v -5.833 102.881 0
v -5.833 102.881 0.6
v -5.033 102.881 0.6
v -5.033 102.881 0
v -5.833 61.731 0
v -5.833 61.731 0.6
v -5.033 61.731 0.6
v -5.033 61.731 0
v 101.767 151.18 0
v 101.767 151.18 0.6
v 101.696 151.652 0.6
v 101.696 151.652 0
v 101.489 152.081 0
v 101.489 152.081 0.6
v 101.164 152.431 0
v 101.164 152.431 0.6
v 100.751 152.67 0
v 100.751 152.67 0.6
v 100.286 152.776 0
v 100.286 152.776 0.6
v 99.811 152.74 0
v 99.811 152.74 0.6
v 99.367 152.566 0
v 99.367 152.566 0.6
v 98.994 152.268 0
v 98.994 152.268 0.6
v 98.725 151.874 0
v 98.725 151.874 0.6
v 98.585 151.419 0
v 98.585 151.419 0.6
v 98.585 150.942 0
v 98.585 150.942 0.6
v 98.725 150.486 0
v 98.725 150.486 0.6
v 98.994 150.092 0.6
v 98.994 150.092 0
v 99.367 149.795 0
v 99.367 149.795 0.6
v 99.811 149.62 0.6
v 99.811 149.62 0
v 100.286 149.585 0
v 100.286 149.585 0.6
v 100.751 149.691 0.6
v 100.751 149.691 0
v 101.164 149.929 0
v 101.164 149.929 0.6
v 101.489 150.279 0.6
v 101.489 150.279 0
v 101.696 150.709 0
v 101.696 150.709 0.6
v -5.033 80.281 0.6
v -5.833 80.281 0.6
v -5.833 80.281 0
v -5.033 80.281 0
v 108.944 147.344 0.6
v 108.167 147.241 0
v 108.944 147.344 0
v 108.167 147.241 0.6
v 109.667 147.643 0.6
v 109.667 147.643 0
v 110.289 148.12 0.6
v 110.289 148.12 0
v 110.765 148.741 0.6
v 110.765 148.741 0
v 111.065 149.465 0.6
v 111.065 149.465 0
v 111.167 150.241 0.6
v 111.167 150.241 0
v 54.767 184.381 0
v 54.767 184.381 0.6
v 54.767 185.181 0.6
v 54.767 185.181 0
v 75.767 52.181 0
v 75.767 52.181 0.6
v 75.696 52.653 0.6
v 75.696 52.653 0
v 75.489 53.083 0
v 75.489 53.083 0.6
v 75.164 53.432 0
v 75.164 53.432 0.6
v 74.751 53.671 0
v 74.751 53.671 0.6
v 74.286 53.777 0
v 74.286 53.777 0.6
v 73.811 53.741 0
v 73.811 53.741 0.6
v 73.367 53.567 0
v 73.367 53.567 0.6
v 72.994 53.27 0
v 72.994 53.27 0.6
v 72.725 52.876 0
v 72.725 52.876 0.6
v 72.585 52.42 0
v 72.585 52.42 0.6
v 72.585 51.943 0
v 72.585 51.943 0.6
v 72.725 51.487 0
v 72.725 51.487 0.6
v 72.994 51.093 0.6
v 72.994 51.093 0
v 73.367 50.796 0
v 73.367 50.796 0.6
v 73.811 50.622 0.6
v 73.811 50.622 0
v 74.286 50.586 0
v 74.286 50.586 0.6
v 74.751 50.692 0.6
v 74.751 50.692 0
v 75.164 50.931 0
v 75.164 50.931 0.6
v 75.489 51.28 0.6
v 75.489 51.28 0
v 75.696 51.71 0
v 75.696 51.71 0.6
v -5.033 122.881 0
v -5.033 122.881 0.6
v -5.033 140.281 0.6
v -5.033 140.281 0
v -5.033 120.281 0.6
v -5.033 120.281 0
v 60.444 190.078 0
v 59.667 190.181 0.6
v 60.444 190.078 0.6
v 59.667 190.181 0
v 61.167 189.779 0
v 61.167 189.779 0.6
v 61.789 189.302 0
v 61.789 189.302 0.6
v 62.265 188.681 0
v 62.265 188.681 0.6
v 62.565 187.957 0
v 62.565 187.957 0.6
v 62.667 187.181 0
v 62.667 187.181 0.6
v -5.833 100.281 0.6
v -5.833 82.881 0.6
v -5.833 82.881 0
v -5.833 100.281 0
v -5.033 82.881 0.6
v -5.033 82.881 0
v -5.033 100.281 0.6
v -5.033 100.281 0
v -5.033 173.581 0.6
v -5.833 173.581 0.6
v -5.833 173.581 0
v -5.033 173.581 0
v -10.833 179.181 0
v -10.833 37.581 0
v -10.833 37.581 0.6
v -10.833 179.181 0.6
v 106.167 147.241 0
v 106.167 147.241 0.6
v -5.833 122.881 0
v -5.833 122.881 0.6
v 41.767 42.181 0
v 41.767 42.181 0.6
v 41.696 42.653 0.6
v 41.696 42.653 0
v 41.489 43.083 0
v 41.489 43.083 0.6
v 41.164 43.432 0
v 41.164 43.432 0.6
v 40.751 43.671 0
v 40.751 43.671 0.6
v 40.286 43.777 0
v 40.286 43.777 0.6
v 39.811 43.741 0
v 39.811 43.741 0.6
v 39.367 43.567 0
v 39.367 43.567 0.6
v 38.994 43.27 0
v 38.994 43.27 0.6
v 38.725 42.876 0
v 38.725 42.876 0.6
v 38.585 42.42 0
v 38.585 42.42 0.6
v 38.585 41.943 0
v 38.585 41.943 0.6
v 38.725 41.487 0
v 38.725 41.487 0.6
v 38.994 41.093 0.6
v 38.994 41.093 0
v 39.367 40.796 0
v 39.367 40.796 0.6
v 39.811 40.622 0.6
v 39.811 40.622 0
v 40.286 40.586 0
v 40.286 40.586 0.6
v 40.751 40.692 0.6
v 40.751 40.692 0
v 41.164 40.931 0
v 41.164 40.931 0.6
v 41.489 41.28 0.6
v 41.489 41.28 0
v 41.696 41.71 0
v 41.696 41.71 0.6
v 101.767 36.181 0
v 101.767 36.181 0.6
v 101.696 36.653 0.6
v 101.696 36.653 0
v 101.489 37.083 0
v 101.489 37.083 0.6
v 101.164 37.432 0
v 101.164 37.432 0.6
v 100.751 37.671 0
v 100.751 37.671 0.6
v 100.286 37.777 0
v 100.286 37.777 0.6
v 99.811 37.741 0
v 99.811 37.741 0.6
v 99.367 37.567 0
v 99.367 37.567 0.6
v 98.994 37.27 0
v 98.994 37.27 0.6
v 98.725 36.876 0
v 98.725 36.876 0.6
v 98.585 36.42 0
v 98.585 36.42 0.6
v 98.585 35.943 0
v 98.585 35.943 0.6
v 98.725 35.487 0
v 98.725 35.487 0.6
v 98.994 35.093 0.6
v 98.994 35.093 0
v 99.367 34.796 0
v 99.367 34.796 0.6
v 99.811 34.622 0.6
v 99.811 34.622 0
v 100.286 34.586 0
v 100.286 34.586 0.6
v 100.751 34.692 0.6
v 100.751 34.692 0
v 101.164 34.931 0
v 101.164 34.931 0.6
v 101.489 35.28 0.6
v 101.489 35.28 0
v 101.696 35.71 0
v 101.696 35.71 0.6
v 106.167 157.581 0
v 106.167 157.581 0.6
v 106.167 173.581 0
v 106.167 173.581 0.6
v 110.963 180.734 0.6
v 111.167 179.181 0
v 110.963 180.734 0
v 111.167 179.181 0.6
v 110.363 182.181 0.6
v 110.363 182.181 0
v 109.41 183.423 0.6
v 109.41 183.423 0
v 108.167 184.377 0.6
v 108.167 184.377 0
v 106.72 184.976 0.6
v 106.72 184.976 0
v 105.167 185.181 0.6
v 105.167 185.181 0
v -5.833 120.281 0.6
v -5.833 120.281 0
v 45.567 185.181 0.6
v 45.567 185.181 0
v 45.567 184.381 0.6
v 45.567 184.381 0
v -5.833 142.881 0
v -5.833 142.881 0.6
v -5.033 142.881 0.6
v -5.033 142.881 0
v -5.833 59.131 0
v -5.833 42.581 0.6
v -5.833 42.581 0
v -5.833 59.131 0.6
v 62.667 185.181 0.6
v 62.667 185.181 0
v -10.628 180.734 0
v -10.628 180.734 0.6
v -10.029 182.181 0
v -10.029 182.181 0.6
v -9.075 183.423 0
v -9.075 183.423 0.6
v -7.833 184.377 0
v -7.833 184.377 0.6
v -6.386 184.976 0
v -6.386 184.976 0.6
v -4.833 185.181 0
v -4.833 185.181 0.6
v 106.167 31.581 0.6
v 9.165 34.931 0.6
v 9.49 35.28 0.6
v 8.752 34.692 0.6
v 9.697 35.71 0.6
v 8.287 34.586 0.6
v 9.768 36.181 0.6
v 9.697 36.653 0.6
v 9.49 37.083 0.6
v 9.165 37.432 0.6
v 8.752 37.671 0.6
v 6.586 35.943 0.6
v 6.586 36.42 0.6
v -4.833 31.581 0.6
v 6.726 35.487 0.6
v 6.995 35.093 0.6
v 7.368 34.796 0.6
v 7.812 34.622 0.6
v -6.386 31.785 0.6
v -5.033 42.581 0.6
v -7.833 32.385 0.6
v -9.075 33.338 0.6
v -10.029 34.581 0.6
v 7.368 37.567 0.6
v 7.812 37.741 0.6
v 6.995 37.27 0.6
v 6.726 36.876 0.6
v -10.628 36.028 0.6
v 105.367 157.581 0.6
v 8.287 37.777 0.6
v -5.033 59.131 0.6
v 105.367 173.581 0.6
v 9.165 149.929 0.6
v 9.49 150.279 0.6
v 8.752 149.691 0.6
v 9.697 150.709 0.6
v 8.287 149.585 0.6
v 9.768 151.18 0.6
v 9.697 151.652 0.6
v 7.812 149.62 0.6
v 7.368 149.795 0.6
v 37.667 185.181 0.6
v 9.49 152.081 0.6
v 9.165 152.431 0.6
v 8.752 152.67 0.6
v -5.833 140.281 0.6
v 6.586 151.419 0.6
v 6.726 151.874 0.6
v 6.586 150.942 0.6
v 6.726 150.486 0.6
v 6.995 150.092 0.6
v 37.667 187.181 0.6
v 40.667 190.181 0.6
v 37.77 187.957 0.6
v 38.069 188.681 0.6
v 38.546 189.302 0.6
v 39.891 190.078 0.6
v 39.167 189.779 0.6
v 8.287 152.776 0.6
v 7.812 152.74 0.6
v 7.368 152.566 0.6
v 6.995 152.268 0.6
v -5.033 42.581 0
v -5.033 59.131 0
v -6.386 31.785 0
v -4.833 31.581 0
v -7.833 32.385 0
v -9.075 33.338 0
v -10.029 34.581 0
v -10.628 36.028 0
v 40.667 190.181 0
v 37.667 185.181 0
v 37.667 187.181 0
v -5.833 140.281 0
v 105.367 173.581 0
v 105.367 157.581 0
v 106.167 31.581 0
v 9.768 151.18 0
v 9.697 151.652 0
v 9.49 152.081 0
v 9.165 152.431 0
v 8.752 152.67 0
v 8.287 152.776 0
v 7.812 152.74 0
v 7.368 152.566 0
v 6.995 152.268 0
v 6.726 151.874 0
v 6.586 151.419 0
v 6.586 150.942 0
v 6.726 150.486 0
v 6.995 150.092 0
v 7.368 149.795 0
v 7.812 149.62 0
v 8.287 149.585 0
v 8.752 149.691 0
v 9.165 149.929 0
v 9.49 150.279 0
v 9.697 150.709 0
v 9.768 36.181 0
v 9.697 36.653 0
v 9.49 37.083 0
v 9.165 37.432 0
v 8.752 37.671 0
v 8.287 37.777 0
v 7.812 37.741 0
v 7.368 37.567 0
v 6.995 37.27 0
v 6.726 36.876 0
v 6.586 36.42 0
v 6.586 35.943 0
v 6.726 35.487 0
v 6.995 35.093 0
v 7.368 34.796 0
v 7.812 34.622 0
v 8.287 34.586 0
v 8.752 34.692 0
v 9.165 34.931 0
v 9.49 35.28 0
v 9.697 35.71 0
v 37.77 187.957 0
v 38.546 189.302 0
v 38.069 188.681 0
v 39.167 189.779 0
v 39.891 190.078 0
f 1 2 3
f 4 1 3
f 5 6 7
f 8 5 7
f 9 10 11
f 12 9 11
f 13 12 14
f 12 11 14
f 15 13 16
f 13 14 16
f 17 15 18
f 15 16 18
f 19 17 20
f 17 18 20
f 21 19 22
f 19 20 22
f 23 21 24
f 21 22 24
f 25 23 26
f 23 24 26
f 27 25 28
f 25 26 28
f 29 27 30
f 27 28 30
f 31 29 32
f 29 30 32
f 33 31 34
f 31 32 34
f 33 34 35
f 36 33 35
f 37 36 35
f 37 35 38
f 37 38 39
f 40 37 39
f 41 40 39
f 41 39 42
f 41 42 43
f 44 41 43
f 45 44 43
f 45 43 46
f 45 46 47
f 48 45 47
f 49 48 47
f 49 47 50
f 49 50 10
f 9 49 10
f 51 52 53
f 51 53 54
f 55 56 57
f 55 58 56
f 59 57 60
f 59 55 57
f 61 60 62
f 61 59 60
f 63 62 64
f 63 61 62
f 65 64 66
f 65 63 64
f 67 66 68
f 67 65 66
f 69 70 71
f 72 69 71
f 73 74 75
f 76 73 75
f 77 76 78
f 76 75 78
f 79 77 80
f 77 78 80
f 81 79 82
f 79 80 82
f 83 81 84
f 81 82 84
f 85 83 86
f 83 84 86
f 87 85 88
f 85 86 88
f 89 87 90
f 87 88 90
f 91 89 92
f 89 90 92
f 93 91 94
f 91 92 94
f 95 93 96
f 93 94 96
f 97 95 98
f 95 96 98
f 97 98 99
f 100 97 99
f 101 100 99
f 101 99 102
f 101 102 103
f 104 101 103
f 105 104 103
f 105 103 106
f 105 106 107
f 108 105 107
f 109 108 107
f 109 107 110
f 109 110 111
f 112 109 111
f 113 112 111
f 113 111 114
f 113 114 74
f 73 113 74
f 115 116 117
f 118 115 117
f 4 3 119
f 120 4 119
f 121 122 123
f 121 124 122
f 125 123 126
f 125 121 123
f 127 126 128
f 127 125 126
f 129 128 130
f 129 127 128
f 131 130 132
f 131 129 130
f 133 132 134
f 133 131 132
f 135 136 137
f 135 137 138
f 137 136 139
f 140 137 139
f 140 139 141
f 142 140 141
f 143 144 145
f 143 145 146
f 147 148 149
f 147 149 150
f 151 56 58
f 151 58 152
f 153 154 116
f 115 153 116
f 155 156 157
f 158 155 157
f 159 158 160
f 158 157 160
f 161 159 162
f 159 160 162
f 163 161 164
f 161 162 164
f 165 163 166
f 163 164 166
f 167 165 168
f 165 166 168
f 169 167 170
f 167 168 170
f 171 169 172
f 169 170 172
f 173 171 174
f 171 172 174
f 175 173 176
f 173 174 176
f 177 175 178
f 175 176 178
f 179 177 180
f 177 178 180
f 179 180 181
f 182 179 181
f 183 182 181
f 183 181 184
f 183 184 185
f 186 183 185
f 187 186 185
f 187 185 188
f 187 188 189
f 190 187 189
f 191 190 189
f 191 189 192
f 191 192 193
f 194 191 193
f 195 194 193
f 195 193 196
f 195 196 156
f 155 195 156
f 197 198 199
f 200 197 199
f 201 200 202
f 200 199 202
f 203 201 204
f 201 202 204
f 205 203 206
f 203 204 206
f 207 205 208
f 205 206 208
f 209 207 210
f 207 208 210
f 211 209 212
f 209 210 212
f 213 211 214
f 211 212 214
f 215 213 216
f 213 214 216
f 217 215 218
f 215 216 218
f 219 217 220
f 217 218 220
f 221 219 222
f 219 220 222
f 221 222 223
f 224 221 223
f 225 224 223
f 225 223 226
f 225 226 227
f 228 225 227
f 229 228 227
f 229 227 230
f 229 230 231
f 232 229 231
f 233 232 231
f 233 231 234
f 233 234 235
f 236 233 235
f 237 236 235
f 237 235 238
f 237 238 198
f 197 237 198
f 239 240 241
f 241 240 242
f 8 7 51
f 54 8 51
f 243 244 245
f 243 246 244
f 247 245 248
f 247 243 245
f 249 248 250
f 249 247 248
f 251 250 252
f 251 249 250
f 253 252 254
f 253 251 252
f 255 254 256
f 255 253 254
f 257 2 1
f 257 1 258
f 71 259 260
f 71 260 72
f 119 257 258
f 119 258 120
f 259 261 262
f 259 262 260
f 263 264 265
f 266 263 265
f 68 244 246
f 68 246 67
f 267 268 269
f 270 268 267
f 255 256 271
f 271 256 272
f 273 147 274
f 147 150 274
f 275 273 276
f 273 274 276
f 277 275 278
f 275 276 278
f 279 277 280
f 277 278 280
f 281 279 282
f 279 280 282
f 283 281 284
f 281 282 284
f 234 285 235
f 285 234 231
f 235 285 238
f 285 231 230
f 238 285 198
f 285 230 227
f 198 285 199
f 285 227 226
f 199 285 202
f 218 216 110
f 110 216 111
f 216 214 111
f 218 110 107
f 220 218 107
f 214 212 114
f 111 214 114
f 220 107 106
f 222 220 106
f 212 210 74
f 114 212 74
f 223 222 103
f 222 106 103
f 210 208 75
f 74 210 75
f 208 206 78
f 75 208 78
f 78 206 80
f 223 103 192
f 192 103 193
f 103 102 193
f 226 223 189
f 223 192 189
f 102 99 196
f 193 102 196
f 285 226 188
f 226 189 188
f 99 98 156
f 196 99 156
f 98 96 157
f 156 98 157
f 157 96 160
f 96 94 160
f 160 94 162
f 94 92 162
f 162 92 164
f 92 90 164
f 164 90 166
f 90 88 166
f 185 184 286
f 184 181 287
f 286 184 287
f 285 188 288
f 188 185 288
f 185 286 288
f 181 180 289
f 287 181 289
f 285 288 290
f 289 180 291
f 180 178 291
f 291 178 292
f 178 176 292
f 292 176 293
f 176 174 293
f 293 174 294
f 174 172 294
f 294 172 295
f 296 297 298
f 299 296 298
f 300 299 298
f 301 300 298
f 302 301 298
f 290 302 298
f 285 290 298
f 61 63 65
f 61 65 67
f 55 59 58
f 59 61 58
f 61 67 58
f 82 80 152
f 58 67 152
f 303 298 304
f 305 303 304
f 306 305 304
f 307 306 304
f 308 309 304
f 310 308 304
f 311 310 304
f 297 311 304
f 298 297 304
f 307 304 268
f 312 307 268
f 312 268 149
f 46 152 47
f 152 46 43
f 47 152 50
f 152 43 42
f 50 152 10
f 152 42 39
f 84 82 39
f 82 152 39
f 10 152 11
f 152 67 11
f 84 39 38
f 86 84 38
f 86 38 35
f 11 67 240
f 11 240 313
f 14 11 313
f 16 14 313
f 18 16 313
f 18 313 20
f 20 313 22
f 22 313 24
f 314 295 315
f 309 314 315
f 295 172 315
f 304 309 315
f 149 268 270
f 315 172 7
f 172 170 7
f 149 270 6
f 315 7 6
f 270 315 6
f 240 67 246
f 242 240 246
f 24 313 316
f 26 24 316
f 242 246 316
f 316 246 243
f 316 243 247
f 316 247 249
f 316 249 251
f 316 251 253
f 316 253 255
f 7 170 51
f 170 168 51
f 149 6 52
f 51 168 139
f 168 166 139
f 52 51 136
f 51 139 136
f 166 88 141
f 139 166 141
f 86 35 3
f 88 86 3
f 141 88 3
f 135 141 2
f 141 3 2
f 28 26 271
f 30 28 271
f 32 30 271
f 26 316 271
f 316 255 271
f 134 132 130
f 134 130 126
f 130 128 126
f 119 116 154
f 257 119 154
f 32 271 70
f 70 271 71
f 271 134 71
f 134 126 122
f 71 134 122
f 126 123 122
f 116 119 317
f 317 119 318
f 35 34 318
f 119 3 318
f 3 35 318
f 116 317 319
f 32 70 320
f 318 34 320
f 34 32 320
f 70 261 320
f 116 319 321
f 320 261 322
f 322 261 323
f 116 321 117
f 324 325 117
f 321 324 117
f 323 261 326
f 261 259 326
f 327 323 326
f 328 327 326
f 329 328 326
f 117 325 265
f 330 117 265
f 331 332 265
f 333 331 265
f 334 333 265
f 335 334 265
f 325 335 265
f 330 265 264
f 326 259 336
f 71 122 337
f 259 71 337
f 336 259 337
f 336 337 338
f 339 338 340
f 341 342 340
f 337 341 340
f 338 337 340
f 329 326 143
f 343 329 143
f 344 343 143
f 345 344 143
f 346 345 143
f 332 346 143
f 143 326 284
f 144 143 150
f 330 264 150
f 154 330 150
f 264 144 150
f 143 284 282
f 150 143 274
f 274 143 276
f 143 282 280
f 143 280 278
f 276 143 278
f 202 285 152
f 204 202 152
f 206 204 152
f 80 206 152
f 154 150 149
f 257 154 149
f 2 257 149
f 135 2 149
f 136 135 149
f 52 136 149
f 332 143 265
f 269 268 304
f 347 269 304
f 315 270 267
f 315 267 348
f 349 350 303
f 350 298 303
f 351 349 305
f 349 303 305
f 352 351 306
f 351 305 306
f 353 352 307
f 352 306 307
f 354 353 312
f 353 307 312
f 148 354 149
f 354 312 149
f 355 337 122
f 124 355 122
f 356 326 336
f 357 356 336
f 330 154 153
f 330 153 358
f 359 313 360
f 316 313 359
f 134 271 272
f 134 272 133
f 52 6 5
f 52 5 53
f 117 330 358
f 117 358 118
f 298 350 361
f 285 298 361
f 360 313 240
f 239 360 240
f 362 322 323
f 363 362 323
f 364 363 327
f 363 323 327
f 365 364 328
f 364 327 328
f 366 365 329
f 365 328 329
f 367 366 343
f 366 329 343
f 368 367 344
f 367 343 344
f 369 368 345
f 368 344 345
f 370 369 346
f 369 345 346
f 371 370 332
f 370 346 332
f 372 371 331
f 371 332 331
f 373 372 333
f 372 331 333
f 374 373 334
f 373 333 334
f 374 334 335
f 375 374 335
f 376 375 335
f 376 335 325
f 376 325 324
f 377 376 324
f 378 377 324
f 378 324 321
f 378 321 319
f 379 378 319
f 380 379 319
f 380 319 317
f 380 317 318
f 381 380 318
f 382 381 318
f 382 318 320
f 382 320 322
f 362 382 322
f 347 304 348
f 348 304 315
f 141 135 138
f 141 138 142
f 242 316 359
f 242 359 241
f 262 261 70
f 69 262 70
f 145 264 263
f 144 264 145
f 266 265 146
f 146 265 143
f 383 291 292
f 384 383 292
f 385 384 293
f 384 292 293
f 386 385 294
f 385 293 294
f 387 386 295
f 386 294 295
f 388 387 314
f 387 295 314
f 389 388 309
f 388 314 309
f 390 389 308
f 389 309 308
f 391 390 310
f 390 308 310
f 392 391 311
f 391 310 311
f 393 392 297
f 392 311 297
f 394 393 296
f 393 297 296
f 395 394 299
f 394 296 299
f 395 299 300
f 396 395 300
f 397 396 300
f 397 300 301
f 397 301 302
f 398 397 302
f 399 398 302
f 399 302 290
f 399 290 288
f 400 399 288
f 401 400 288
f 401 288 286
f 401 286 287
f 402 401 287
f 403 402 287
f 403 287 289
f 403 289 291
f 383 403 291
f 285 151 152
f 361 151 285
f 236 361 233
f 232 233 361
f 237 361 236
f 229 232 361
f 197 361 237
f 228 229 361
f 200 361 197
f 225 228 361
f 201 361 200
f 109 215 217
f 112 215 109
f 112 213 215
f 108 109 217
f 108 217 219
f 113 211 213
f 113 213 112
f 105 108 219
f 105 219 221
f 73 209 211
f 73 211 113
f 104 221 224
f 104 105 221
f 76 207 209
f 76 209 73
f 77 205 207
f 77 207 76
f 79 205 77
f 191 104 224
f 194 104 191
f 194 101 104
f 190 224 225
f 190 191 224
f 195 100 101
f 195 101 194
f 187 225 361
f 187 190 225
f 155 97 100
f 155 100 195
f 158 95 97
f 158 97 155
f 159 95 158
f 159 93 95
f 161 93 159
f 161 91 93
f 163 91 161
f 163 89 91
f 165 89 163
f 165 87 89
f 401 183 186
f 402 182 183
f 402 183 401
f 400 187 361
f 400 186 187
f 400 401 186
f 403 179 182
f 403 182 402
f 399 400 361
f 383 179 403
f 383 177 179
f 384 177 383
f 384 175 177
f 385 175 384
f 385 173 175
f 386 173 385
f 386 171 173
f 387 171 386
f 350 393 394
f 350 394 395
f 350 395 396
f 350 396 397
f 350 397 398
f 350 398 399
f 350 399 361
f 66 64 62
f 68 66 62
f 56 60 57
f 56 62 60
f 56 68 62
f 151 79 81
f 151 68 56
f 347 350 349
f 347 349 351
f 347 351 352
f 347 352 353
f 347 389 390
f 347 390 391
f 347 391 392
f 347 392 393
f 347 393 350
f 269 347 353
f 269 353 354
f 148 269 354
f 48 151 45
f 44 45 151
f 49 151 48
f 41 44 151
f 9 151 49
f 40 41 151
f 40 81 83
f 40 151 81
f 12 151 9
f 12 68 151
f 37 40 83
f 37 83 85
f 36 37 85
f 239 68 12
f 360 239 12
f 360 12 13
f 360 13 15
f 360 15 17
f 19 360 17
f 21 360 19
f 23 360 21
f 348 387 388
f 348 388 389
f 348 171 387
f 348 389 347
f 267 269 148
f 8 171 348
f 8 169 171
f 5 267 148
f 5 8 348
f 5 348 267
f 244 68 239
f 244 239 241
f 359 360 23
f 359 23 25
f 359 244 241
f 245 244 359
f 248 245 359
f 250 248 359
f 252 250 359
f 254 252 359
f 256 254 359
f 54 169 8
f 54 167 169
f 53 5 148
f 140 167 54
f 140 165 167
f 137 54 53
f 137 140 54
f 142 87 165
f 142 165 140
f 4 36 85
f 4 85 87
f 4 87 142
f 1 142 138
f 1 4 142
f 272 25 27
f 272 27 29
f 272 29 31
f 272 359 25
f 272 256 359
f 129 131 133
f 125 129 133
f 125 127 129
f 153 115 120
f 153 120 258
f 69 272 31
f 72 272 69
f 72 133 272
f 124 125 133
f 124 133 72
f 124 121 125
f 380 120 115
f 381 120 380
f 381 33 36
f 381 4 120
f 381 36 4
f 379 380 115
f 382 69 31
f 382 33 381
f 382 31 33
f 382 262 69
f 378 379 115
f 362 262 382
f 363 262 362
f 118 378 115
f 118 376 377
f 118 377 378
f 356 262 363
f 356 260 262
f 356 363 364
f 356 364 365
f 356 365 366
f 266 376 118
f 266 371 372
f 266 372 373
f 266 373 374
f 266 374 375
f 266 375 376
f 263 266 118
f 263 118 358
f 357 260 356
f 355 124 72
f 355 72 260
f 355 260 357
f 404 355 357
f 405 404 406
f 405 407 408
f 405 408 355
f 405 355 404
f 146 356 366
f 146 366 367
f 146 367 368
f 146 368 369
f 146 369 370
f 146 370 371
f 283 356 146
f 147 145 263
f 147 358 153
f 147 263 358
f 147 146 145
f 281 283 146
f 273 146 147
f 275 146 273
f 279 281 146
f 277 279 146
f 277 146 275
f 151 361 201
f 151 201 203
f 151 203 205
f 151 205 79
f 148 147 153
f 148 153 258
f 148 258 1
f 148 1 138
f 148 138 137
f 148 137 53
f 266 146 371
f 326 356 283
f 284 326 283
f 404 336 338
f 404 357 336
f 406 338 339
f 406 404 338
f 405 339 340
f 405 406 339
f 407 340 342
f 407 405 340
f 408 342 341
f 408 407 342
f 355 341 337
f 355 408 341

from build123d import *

# Parameters (mm, degrees)
BOSS_EXTRUDE1_DEPTH = 0.6
SKETCH14_R          = 1.6
SKETCH14_W          = 0.8
SKETCH14_H          = 30.7
SKETCH14_H_2        = 16.55
SKETCH14_H_3        = 17.4
SKETCH14_H_4        = 18.55
SKETCH14_H_5        = 16
CUT_EXTRUDE1_DEPTH  = 1.6
FILLET3_R           = 6
SKETCH15_R          = 1.6
CUT_EXTRUDE2_DEPTH  = 1.6
SKETCH16_W          = 25
SKETCH16_H          = 5
BOSS_EXTRUDE2_DEPTH = 0.6
SKETCH17_W          = 9.2
SKETCH17_H          = 0.8
CUT_EXTRUDE3_DEPTH  = 1.6
FILLET4_R           = 3


with BuildPart() as part:
    # Sketch2 → Boss-Extrude1 (new body)
    with BuildSketch(Plane.XY):
        Polygon((106.16728925, 147.241288665), (106.16728925, 31.58105), (24.16705825, 31.58105), (-10.832812, 31.58105), (-10.832812, 185.1806075), (24.16705825, 185.1806075), (106.16728925, 185.1806075), (111.16728925, 185.1806075), (111.16728925, 147.241288665), align=None)
    extrude(amount=BOSS_EXTRUDE1_DEPTH)

    # Sketch14 → Cut-Extrude1 (cut, through all)
    with BuildSketch(Plane.XY.offset(0.6)):
        with Locations((100.166839875, 36.181495)):
            Circle(SKETCH14_R)
        with Locations((8.167632375, 36.181495)):
            Circle(SKETCH14_R)
        with Locations((8.167632375, 151.18016)):
            Circle(SKETCH14_R)
        with Locations((100.166839875, 151.18016)):
            Circle(SKETCH14_R)
        with Locations((-5.432812, 158.23105)):
            Rectangle(SKETCH14_W, SKETCH14_H)
        with Locations((-5.432812, 50.85605)):
            Rectangle(SKETCH14_W, SKETCH14_H_2)
        with Locations((-5.432812, 131.58105)):
            Rectangle(SKETCH14_W, SKETCH14_H_3)
        with Locations((-5.432812, 71.00605)):
            Rectangle(SKETCH14_W, SKETCH14_H_4)
        with Locations((-5.432812, 91.58105)):
            Rectangle(SKETCH14_W, SKETCH14_H_3)
        with Locations((-5.432812, 111.58105)):
            Rectangle(SKETCH14_W, SKETCH14_H_3)
        with Locations((105.76728925, 165.58105)):
            Rectangle(SKETCH14_W, SKETCH14_H_5)
    extrude(amount=-CUT_EXTRUDE1_DEPTH, mode=Mode.SUBTRACT)

    # Fillet3
    fillet3_edges = [part.edges().sort_by_distance(p)[0] for p in [
        (111.16728925, 185.1806075, 0.3),
        (-10.832812, 31.58105, 0.3),
        (-10.832812, 185.1806075, 0.3),
    ]]
    fillet(fillet3_edges, radius=FILLET3_R)

    # Sketch15 → Cut-Extrude2 (cut, through all)
    with BuildSketch(Plane.XY.offset(0.6)):
        with Locations((74.166839875, 52.181495)):
            Circle(SKETCH15_R)
        with Locations((40.166839875, 42.181495)):
            Circle(SKETCH15_R)
    extrude(amount=-CUT_EXTRUDE2_DEPTH, mode=Mode.SUBTRACT)

    # Sketch16 → Boss-Extrude2 (add)
    with BuildSketch(Plane.XY.offset(0.6)):
        with Locations((50.16728925, 187.6806075)):
            Rectangle(SKETCH16_W, SKETCH16_H)
    extrude(amount=-BOSS_EXTRUDE2_DEPTH)

    # Sketch17 → Cut-Extrude3 (cut, through all)
    with BuildSketch(Plane.XY.offset(0.6)):
        with Locations((50.16728925, 184.7806075)):
            Rectangle(SKETCH17_W, SKETCH17_H)
    extrude(amount=-CUT_EXTRUDE3_DEPTH, mode=Mode.SUBTRACT)

    # Fillet4
    fillet4_edges = [part.edges().sort_by_distance(p)[0] for p in [
        (111.16728925, 147.241288665, 0.3),
        (37.66728925, 190.1806075, 0.3),
        (62.66728925, 190.1806075, 0.3),
    ]]
    fillet(fillet4_edges, radius=FILLET4_R)


solid = part.part
